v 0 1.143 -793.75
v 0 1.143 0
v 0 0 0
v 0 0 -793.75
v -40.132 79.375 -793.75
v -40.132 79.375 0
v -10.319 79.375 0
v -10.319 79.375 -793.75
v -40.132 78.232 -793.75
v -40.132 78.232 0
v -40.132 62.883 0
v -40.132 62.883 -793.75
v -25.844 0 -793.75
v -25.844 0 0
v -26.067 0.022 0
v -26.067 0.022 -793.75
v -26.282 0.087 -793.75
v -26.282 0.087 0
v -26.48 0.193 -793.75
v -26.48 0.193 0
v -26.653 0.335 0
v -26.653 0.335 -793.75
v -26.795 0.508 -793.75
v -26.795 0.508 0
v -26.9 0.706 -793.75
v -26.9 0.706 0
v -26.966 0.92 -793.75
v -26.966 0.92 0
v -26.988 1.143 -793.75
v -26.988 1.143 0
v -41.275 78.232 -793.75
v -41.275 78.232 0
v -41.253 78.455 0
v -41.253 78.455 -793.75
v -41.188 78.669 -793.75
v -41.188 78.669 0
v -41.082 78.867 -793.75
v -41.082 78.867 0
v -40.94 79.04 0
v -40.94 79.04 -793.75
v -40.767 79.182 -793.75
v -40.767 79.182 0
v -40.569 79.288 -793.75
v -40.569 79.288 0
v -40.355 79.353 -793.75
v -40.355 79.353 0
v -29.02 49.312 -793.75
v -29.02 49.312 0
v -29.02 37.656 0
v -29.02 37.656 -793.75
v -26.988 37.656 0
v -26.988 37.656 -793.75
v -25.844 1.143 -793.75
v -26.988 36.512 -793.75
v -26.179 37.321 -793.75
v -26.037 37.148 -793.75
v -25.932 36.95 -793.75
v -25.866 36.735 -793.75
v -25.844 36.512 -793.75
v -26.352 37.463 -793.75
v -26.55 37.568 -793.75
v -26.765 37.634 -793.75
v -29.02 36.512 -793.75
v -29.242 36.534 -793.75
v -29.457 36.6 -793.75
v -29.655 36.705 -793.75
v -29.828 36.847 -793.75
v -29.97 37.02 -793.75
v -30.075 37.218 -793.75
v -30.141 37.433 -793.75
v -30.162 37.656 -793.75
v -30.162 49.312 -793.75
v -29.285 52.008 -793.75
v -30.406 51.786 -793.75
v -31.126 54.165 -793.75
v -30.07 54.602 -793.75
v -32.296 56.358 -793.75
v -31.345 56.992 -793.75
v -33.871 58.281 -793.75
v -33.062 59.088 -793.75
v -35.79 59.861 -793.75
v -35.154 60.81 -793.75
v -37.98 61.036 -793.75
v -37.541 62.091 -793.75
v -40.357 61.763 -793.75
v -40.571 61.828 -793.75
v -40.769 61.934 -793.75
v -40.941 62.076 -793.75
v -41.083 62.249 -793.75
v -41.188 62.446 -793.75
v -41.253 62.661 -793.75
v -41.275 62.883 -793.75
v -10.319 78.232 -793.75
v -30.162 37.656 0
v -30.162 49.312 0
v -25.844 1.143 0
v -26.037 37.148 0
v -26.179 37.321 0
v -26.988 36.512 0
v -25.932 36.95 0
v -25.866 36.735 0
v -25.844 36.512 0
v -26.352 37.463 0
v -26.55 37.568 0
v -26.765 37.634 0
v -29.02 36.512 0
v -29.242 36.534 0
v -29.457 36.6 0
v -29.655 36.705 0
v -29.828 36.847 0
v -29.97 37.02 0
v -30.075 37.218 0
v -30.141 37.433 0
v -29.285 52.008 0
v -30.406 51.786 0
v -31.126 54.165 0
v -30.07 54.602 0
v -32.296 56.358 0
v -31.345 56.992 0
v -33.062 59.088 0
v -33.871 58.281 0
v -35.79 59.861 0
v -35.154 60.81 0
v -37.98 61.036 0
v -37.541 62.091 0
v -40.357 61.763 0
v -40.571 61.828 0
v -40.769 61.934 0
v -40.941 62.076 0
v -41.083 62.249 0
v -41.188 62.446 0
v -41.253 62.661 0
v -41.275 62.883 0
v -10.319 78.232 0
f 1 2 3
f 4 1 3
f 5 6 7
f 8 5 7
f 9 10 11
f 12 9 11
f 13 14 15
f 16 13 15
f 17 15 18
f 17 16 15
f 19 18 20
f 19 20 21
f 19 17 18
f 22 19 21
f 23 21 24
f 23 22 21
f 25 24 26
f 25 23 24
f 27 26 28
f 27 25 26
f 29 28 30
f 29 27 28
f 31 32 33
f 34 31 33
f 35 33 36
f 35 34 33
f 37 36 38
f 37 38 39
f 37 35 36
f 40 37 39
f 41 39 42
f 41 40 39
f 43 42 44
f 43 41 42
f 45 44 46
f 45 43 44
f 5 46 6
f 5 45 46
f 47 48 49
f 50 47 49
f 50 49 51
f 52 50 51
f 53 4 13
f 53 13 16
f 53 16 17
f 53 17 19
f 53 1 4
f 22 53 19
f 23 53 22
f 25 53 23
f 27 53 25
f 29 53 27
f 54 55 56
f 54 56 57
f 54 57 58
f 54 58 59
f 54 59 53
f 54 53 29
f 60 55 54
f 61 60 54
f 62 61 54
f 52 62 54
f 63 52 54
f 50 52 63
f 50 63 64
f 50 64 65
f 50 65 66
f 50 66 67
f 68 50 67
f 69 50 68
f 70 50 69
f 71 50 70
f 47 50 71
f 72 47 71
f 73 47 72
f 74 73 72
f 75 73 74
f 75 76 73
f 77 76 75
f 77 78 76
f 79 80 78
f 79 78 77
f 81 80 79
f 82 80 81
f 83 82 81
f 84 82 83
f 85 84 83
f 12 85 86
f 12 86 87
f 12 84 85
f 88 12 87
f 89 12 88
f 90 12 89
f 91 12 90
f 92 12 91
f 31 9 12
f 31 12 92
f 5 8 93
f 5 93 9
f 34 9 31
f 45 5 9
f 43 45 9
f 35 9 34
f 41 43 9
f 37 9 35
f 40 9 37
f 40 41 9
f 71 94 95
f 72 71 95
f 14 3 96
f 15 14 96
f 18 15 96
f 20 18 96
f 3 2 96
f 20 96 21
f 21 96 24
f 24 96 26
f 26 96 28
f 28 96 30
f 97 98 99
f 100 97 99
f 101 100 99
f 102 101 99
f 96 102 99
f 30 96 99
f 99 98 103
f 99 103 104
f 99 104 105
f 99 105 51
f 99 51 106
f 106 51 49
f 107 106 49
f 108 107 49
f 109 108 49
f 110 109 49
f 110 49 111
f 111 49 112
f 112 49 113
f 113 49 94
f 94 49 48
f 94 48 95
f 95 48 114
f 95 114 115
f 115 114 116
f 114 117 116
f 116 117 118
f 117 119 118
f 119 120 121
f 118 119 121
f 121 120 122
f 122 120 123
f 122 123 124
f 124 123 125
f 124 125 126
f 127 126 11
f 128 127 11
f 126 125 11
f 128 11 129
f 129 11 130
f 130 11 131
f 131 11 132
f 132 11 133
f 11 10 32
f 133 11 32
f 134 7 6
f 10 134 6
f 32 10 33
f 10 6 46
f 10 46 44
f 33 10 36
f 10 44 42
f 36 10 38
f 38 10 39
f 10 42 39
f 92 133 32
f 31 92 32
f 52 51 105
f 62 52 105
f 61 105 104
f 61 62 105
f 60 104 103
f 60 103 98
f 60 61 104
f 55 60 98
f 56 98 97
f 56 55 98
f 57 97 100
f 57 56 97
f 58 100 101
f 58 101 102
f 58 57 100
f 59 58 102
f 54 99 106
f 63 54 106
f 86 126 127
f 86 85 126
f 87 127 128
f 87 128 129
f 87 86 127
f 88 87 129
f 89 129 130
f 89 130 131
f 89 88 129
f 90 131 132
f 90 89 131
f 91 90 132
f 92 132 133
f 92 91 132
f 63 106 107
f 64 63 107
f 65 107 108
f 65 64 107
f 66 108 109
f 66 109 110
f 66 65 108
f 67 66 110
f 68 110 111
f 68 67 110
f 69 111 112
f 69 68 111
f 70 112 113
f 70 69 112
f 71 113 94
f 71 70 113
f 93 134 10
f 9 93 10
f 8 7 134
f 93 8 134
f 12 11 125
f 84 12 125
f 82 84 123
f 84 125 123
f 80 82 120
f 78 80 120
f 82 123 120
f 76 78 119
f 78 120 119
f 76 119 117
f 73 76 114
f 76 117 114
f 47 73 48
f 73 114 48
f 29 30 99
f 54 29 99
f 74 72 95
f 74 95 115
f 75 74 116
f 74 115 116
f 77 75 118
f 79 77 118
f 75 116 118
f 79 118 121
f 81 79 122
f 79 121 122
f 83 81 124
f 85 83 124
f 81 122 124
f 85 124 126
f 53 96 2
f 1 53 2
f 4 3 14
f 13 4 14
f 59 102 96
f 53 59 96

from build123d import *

# Parameters (mm, degrees)
EXTRUDE_THIN1_DEPTH = 793.75
FILLET1_R           = 1.143


with BuildPart() as part:
    # Sketch1 → Extrude-Thin1 (new body)
    with BuildSketch(Plane.XY):
        with BuildLine():
            Line((0, 0), (-26.9875, 0))
            Line((-26.9875, 0), (-26.9875, 36.5125))
            Line((-26.9875, 36.5125), (-30.1625, 36.5125))
            Line((-30.1625, 36.5125), (-30.1625, 49.312109381))
            ThreePointArc((-30.1625, 49.312109381), (-33.3375, 57.712369794), (-41.275, 61.9125))
            Line((-41.275, 61.9125), (-41.275, 79.375))
            Line((-41.275, 79.375), (-10.31875, 79.375))
            Line((-10.31875, 79.375), (-10.31875, 78.232))
            Line((-10.31875, 78.232), (-40.132, 78.232))
            Line((-40.132, 78.232), (-40.132, 62.883145405))
            ThreePointArc((-40.132, 62.883145405), (-32.152062089, 58.082238727), (-29.0195, 49.312109381))
            Line((-29.0195, 49.312109381), (-29.0195, 37.6555))
            Line((-29.0195, 37.6555), (-25.8445, 37.6555))
            Line((-25.8445, 37.6555), (-25.8445, 1.143))
            Line((-25.8445, 1.143), (0, 1.143))
            Line((0, 1.143), (0, 0))
        make_face()
    extrude(amount=-EXTRUDE_THIN1_DEPTH)

    # Fillet1
    fillet1_edges = [part.edges().sort_by_distance(p)[0] for p in [
        (-25.8445, 37.6555, -396.875),
        (-26.9875, 0, -396.875),
        (-30.1625, 36.5125, -396.875),
        (-41.275, 61.9125, -396.875),
        (-41.275, 79.375, -396.875),
    ]]
    fillet(fillet1_edges, radius=FILLET1_R)


solid = part.part
